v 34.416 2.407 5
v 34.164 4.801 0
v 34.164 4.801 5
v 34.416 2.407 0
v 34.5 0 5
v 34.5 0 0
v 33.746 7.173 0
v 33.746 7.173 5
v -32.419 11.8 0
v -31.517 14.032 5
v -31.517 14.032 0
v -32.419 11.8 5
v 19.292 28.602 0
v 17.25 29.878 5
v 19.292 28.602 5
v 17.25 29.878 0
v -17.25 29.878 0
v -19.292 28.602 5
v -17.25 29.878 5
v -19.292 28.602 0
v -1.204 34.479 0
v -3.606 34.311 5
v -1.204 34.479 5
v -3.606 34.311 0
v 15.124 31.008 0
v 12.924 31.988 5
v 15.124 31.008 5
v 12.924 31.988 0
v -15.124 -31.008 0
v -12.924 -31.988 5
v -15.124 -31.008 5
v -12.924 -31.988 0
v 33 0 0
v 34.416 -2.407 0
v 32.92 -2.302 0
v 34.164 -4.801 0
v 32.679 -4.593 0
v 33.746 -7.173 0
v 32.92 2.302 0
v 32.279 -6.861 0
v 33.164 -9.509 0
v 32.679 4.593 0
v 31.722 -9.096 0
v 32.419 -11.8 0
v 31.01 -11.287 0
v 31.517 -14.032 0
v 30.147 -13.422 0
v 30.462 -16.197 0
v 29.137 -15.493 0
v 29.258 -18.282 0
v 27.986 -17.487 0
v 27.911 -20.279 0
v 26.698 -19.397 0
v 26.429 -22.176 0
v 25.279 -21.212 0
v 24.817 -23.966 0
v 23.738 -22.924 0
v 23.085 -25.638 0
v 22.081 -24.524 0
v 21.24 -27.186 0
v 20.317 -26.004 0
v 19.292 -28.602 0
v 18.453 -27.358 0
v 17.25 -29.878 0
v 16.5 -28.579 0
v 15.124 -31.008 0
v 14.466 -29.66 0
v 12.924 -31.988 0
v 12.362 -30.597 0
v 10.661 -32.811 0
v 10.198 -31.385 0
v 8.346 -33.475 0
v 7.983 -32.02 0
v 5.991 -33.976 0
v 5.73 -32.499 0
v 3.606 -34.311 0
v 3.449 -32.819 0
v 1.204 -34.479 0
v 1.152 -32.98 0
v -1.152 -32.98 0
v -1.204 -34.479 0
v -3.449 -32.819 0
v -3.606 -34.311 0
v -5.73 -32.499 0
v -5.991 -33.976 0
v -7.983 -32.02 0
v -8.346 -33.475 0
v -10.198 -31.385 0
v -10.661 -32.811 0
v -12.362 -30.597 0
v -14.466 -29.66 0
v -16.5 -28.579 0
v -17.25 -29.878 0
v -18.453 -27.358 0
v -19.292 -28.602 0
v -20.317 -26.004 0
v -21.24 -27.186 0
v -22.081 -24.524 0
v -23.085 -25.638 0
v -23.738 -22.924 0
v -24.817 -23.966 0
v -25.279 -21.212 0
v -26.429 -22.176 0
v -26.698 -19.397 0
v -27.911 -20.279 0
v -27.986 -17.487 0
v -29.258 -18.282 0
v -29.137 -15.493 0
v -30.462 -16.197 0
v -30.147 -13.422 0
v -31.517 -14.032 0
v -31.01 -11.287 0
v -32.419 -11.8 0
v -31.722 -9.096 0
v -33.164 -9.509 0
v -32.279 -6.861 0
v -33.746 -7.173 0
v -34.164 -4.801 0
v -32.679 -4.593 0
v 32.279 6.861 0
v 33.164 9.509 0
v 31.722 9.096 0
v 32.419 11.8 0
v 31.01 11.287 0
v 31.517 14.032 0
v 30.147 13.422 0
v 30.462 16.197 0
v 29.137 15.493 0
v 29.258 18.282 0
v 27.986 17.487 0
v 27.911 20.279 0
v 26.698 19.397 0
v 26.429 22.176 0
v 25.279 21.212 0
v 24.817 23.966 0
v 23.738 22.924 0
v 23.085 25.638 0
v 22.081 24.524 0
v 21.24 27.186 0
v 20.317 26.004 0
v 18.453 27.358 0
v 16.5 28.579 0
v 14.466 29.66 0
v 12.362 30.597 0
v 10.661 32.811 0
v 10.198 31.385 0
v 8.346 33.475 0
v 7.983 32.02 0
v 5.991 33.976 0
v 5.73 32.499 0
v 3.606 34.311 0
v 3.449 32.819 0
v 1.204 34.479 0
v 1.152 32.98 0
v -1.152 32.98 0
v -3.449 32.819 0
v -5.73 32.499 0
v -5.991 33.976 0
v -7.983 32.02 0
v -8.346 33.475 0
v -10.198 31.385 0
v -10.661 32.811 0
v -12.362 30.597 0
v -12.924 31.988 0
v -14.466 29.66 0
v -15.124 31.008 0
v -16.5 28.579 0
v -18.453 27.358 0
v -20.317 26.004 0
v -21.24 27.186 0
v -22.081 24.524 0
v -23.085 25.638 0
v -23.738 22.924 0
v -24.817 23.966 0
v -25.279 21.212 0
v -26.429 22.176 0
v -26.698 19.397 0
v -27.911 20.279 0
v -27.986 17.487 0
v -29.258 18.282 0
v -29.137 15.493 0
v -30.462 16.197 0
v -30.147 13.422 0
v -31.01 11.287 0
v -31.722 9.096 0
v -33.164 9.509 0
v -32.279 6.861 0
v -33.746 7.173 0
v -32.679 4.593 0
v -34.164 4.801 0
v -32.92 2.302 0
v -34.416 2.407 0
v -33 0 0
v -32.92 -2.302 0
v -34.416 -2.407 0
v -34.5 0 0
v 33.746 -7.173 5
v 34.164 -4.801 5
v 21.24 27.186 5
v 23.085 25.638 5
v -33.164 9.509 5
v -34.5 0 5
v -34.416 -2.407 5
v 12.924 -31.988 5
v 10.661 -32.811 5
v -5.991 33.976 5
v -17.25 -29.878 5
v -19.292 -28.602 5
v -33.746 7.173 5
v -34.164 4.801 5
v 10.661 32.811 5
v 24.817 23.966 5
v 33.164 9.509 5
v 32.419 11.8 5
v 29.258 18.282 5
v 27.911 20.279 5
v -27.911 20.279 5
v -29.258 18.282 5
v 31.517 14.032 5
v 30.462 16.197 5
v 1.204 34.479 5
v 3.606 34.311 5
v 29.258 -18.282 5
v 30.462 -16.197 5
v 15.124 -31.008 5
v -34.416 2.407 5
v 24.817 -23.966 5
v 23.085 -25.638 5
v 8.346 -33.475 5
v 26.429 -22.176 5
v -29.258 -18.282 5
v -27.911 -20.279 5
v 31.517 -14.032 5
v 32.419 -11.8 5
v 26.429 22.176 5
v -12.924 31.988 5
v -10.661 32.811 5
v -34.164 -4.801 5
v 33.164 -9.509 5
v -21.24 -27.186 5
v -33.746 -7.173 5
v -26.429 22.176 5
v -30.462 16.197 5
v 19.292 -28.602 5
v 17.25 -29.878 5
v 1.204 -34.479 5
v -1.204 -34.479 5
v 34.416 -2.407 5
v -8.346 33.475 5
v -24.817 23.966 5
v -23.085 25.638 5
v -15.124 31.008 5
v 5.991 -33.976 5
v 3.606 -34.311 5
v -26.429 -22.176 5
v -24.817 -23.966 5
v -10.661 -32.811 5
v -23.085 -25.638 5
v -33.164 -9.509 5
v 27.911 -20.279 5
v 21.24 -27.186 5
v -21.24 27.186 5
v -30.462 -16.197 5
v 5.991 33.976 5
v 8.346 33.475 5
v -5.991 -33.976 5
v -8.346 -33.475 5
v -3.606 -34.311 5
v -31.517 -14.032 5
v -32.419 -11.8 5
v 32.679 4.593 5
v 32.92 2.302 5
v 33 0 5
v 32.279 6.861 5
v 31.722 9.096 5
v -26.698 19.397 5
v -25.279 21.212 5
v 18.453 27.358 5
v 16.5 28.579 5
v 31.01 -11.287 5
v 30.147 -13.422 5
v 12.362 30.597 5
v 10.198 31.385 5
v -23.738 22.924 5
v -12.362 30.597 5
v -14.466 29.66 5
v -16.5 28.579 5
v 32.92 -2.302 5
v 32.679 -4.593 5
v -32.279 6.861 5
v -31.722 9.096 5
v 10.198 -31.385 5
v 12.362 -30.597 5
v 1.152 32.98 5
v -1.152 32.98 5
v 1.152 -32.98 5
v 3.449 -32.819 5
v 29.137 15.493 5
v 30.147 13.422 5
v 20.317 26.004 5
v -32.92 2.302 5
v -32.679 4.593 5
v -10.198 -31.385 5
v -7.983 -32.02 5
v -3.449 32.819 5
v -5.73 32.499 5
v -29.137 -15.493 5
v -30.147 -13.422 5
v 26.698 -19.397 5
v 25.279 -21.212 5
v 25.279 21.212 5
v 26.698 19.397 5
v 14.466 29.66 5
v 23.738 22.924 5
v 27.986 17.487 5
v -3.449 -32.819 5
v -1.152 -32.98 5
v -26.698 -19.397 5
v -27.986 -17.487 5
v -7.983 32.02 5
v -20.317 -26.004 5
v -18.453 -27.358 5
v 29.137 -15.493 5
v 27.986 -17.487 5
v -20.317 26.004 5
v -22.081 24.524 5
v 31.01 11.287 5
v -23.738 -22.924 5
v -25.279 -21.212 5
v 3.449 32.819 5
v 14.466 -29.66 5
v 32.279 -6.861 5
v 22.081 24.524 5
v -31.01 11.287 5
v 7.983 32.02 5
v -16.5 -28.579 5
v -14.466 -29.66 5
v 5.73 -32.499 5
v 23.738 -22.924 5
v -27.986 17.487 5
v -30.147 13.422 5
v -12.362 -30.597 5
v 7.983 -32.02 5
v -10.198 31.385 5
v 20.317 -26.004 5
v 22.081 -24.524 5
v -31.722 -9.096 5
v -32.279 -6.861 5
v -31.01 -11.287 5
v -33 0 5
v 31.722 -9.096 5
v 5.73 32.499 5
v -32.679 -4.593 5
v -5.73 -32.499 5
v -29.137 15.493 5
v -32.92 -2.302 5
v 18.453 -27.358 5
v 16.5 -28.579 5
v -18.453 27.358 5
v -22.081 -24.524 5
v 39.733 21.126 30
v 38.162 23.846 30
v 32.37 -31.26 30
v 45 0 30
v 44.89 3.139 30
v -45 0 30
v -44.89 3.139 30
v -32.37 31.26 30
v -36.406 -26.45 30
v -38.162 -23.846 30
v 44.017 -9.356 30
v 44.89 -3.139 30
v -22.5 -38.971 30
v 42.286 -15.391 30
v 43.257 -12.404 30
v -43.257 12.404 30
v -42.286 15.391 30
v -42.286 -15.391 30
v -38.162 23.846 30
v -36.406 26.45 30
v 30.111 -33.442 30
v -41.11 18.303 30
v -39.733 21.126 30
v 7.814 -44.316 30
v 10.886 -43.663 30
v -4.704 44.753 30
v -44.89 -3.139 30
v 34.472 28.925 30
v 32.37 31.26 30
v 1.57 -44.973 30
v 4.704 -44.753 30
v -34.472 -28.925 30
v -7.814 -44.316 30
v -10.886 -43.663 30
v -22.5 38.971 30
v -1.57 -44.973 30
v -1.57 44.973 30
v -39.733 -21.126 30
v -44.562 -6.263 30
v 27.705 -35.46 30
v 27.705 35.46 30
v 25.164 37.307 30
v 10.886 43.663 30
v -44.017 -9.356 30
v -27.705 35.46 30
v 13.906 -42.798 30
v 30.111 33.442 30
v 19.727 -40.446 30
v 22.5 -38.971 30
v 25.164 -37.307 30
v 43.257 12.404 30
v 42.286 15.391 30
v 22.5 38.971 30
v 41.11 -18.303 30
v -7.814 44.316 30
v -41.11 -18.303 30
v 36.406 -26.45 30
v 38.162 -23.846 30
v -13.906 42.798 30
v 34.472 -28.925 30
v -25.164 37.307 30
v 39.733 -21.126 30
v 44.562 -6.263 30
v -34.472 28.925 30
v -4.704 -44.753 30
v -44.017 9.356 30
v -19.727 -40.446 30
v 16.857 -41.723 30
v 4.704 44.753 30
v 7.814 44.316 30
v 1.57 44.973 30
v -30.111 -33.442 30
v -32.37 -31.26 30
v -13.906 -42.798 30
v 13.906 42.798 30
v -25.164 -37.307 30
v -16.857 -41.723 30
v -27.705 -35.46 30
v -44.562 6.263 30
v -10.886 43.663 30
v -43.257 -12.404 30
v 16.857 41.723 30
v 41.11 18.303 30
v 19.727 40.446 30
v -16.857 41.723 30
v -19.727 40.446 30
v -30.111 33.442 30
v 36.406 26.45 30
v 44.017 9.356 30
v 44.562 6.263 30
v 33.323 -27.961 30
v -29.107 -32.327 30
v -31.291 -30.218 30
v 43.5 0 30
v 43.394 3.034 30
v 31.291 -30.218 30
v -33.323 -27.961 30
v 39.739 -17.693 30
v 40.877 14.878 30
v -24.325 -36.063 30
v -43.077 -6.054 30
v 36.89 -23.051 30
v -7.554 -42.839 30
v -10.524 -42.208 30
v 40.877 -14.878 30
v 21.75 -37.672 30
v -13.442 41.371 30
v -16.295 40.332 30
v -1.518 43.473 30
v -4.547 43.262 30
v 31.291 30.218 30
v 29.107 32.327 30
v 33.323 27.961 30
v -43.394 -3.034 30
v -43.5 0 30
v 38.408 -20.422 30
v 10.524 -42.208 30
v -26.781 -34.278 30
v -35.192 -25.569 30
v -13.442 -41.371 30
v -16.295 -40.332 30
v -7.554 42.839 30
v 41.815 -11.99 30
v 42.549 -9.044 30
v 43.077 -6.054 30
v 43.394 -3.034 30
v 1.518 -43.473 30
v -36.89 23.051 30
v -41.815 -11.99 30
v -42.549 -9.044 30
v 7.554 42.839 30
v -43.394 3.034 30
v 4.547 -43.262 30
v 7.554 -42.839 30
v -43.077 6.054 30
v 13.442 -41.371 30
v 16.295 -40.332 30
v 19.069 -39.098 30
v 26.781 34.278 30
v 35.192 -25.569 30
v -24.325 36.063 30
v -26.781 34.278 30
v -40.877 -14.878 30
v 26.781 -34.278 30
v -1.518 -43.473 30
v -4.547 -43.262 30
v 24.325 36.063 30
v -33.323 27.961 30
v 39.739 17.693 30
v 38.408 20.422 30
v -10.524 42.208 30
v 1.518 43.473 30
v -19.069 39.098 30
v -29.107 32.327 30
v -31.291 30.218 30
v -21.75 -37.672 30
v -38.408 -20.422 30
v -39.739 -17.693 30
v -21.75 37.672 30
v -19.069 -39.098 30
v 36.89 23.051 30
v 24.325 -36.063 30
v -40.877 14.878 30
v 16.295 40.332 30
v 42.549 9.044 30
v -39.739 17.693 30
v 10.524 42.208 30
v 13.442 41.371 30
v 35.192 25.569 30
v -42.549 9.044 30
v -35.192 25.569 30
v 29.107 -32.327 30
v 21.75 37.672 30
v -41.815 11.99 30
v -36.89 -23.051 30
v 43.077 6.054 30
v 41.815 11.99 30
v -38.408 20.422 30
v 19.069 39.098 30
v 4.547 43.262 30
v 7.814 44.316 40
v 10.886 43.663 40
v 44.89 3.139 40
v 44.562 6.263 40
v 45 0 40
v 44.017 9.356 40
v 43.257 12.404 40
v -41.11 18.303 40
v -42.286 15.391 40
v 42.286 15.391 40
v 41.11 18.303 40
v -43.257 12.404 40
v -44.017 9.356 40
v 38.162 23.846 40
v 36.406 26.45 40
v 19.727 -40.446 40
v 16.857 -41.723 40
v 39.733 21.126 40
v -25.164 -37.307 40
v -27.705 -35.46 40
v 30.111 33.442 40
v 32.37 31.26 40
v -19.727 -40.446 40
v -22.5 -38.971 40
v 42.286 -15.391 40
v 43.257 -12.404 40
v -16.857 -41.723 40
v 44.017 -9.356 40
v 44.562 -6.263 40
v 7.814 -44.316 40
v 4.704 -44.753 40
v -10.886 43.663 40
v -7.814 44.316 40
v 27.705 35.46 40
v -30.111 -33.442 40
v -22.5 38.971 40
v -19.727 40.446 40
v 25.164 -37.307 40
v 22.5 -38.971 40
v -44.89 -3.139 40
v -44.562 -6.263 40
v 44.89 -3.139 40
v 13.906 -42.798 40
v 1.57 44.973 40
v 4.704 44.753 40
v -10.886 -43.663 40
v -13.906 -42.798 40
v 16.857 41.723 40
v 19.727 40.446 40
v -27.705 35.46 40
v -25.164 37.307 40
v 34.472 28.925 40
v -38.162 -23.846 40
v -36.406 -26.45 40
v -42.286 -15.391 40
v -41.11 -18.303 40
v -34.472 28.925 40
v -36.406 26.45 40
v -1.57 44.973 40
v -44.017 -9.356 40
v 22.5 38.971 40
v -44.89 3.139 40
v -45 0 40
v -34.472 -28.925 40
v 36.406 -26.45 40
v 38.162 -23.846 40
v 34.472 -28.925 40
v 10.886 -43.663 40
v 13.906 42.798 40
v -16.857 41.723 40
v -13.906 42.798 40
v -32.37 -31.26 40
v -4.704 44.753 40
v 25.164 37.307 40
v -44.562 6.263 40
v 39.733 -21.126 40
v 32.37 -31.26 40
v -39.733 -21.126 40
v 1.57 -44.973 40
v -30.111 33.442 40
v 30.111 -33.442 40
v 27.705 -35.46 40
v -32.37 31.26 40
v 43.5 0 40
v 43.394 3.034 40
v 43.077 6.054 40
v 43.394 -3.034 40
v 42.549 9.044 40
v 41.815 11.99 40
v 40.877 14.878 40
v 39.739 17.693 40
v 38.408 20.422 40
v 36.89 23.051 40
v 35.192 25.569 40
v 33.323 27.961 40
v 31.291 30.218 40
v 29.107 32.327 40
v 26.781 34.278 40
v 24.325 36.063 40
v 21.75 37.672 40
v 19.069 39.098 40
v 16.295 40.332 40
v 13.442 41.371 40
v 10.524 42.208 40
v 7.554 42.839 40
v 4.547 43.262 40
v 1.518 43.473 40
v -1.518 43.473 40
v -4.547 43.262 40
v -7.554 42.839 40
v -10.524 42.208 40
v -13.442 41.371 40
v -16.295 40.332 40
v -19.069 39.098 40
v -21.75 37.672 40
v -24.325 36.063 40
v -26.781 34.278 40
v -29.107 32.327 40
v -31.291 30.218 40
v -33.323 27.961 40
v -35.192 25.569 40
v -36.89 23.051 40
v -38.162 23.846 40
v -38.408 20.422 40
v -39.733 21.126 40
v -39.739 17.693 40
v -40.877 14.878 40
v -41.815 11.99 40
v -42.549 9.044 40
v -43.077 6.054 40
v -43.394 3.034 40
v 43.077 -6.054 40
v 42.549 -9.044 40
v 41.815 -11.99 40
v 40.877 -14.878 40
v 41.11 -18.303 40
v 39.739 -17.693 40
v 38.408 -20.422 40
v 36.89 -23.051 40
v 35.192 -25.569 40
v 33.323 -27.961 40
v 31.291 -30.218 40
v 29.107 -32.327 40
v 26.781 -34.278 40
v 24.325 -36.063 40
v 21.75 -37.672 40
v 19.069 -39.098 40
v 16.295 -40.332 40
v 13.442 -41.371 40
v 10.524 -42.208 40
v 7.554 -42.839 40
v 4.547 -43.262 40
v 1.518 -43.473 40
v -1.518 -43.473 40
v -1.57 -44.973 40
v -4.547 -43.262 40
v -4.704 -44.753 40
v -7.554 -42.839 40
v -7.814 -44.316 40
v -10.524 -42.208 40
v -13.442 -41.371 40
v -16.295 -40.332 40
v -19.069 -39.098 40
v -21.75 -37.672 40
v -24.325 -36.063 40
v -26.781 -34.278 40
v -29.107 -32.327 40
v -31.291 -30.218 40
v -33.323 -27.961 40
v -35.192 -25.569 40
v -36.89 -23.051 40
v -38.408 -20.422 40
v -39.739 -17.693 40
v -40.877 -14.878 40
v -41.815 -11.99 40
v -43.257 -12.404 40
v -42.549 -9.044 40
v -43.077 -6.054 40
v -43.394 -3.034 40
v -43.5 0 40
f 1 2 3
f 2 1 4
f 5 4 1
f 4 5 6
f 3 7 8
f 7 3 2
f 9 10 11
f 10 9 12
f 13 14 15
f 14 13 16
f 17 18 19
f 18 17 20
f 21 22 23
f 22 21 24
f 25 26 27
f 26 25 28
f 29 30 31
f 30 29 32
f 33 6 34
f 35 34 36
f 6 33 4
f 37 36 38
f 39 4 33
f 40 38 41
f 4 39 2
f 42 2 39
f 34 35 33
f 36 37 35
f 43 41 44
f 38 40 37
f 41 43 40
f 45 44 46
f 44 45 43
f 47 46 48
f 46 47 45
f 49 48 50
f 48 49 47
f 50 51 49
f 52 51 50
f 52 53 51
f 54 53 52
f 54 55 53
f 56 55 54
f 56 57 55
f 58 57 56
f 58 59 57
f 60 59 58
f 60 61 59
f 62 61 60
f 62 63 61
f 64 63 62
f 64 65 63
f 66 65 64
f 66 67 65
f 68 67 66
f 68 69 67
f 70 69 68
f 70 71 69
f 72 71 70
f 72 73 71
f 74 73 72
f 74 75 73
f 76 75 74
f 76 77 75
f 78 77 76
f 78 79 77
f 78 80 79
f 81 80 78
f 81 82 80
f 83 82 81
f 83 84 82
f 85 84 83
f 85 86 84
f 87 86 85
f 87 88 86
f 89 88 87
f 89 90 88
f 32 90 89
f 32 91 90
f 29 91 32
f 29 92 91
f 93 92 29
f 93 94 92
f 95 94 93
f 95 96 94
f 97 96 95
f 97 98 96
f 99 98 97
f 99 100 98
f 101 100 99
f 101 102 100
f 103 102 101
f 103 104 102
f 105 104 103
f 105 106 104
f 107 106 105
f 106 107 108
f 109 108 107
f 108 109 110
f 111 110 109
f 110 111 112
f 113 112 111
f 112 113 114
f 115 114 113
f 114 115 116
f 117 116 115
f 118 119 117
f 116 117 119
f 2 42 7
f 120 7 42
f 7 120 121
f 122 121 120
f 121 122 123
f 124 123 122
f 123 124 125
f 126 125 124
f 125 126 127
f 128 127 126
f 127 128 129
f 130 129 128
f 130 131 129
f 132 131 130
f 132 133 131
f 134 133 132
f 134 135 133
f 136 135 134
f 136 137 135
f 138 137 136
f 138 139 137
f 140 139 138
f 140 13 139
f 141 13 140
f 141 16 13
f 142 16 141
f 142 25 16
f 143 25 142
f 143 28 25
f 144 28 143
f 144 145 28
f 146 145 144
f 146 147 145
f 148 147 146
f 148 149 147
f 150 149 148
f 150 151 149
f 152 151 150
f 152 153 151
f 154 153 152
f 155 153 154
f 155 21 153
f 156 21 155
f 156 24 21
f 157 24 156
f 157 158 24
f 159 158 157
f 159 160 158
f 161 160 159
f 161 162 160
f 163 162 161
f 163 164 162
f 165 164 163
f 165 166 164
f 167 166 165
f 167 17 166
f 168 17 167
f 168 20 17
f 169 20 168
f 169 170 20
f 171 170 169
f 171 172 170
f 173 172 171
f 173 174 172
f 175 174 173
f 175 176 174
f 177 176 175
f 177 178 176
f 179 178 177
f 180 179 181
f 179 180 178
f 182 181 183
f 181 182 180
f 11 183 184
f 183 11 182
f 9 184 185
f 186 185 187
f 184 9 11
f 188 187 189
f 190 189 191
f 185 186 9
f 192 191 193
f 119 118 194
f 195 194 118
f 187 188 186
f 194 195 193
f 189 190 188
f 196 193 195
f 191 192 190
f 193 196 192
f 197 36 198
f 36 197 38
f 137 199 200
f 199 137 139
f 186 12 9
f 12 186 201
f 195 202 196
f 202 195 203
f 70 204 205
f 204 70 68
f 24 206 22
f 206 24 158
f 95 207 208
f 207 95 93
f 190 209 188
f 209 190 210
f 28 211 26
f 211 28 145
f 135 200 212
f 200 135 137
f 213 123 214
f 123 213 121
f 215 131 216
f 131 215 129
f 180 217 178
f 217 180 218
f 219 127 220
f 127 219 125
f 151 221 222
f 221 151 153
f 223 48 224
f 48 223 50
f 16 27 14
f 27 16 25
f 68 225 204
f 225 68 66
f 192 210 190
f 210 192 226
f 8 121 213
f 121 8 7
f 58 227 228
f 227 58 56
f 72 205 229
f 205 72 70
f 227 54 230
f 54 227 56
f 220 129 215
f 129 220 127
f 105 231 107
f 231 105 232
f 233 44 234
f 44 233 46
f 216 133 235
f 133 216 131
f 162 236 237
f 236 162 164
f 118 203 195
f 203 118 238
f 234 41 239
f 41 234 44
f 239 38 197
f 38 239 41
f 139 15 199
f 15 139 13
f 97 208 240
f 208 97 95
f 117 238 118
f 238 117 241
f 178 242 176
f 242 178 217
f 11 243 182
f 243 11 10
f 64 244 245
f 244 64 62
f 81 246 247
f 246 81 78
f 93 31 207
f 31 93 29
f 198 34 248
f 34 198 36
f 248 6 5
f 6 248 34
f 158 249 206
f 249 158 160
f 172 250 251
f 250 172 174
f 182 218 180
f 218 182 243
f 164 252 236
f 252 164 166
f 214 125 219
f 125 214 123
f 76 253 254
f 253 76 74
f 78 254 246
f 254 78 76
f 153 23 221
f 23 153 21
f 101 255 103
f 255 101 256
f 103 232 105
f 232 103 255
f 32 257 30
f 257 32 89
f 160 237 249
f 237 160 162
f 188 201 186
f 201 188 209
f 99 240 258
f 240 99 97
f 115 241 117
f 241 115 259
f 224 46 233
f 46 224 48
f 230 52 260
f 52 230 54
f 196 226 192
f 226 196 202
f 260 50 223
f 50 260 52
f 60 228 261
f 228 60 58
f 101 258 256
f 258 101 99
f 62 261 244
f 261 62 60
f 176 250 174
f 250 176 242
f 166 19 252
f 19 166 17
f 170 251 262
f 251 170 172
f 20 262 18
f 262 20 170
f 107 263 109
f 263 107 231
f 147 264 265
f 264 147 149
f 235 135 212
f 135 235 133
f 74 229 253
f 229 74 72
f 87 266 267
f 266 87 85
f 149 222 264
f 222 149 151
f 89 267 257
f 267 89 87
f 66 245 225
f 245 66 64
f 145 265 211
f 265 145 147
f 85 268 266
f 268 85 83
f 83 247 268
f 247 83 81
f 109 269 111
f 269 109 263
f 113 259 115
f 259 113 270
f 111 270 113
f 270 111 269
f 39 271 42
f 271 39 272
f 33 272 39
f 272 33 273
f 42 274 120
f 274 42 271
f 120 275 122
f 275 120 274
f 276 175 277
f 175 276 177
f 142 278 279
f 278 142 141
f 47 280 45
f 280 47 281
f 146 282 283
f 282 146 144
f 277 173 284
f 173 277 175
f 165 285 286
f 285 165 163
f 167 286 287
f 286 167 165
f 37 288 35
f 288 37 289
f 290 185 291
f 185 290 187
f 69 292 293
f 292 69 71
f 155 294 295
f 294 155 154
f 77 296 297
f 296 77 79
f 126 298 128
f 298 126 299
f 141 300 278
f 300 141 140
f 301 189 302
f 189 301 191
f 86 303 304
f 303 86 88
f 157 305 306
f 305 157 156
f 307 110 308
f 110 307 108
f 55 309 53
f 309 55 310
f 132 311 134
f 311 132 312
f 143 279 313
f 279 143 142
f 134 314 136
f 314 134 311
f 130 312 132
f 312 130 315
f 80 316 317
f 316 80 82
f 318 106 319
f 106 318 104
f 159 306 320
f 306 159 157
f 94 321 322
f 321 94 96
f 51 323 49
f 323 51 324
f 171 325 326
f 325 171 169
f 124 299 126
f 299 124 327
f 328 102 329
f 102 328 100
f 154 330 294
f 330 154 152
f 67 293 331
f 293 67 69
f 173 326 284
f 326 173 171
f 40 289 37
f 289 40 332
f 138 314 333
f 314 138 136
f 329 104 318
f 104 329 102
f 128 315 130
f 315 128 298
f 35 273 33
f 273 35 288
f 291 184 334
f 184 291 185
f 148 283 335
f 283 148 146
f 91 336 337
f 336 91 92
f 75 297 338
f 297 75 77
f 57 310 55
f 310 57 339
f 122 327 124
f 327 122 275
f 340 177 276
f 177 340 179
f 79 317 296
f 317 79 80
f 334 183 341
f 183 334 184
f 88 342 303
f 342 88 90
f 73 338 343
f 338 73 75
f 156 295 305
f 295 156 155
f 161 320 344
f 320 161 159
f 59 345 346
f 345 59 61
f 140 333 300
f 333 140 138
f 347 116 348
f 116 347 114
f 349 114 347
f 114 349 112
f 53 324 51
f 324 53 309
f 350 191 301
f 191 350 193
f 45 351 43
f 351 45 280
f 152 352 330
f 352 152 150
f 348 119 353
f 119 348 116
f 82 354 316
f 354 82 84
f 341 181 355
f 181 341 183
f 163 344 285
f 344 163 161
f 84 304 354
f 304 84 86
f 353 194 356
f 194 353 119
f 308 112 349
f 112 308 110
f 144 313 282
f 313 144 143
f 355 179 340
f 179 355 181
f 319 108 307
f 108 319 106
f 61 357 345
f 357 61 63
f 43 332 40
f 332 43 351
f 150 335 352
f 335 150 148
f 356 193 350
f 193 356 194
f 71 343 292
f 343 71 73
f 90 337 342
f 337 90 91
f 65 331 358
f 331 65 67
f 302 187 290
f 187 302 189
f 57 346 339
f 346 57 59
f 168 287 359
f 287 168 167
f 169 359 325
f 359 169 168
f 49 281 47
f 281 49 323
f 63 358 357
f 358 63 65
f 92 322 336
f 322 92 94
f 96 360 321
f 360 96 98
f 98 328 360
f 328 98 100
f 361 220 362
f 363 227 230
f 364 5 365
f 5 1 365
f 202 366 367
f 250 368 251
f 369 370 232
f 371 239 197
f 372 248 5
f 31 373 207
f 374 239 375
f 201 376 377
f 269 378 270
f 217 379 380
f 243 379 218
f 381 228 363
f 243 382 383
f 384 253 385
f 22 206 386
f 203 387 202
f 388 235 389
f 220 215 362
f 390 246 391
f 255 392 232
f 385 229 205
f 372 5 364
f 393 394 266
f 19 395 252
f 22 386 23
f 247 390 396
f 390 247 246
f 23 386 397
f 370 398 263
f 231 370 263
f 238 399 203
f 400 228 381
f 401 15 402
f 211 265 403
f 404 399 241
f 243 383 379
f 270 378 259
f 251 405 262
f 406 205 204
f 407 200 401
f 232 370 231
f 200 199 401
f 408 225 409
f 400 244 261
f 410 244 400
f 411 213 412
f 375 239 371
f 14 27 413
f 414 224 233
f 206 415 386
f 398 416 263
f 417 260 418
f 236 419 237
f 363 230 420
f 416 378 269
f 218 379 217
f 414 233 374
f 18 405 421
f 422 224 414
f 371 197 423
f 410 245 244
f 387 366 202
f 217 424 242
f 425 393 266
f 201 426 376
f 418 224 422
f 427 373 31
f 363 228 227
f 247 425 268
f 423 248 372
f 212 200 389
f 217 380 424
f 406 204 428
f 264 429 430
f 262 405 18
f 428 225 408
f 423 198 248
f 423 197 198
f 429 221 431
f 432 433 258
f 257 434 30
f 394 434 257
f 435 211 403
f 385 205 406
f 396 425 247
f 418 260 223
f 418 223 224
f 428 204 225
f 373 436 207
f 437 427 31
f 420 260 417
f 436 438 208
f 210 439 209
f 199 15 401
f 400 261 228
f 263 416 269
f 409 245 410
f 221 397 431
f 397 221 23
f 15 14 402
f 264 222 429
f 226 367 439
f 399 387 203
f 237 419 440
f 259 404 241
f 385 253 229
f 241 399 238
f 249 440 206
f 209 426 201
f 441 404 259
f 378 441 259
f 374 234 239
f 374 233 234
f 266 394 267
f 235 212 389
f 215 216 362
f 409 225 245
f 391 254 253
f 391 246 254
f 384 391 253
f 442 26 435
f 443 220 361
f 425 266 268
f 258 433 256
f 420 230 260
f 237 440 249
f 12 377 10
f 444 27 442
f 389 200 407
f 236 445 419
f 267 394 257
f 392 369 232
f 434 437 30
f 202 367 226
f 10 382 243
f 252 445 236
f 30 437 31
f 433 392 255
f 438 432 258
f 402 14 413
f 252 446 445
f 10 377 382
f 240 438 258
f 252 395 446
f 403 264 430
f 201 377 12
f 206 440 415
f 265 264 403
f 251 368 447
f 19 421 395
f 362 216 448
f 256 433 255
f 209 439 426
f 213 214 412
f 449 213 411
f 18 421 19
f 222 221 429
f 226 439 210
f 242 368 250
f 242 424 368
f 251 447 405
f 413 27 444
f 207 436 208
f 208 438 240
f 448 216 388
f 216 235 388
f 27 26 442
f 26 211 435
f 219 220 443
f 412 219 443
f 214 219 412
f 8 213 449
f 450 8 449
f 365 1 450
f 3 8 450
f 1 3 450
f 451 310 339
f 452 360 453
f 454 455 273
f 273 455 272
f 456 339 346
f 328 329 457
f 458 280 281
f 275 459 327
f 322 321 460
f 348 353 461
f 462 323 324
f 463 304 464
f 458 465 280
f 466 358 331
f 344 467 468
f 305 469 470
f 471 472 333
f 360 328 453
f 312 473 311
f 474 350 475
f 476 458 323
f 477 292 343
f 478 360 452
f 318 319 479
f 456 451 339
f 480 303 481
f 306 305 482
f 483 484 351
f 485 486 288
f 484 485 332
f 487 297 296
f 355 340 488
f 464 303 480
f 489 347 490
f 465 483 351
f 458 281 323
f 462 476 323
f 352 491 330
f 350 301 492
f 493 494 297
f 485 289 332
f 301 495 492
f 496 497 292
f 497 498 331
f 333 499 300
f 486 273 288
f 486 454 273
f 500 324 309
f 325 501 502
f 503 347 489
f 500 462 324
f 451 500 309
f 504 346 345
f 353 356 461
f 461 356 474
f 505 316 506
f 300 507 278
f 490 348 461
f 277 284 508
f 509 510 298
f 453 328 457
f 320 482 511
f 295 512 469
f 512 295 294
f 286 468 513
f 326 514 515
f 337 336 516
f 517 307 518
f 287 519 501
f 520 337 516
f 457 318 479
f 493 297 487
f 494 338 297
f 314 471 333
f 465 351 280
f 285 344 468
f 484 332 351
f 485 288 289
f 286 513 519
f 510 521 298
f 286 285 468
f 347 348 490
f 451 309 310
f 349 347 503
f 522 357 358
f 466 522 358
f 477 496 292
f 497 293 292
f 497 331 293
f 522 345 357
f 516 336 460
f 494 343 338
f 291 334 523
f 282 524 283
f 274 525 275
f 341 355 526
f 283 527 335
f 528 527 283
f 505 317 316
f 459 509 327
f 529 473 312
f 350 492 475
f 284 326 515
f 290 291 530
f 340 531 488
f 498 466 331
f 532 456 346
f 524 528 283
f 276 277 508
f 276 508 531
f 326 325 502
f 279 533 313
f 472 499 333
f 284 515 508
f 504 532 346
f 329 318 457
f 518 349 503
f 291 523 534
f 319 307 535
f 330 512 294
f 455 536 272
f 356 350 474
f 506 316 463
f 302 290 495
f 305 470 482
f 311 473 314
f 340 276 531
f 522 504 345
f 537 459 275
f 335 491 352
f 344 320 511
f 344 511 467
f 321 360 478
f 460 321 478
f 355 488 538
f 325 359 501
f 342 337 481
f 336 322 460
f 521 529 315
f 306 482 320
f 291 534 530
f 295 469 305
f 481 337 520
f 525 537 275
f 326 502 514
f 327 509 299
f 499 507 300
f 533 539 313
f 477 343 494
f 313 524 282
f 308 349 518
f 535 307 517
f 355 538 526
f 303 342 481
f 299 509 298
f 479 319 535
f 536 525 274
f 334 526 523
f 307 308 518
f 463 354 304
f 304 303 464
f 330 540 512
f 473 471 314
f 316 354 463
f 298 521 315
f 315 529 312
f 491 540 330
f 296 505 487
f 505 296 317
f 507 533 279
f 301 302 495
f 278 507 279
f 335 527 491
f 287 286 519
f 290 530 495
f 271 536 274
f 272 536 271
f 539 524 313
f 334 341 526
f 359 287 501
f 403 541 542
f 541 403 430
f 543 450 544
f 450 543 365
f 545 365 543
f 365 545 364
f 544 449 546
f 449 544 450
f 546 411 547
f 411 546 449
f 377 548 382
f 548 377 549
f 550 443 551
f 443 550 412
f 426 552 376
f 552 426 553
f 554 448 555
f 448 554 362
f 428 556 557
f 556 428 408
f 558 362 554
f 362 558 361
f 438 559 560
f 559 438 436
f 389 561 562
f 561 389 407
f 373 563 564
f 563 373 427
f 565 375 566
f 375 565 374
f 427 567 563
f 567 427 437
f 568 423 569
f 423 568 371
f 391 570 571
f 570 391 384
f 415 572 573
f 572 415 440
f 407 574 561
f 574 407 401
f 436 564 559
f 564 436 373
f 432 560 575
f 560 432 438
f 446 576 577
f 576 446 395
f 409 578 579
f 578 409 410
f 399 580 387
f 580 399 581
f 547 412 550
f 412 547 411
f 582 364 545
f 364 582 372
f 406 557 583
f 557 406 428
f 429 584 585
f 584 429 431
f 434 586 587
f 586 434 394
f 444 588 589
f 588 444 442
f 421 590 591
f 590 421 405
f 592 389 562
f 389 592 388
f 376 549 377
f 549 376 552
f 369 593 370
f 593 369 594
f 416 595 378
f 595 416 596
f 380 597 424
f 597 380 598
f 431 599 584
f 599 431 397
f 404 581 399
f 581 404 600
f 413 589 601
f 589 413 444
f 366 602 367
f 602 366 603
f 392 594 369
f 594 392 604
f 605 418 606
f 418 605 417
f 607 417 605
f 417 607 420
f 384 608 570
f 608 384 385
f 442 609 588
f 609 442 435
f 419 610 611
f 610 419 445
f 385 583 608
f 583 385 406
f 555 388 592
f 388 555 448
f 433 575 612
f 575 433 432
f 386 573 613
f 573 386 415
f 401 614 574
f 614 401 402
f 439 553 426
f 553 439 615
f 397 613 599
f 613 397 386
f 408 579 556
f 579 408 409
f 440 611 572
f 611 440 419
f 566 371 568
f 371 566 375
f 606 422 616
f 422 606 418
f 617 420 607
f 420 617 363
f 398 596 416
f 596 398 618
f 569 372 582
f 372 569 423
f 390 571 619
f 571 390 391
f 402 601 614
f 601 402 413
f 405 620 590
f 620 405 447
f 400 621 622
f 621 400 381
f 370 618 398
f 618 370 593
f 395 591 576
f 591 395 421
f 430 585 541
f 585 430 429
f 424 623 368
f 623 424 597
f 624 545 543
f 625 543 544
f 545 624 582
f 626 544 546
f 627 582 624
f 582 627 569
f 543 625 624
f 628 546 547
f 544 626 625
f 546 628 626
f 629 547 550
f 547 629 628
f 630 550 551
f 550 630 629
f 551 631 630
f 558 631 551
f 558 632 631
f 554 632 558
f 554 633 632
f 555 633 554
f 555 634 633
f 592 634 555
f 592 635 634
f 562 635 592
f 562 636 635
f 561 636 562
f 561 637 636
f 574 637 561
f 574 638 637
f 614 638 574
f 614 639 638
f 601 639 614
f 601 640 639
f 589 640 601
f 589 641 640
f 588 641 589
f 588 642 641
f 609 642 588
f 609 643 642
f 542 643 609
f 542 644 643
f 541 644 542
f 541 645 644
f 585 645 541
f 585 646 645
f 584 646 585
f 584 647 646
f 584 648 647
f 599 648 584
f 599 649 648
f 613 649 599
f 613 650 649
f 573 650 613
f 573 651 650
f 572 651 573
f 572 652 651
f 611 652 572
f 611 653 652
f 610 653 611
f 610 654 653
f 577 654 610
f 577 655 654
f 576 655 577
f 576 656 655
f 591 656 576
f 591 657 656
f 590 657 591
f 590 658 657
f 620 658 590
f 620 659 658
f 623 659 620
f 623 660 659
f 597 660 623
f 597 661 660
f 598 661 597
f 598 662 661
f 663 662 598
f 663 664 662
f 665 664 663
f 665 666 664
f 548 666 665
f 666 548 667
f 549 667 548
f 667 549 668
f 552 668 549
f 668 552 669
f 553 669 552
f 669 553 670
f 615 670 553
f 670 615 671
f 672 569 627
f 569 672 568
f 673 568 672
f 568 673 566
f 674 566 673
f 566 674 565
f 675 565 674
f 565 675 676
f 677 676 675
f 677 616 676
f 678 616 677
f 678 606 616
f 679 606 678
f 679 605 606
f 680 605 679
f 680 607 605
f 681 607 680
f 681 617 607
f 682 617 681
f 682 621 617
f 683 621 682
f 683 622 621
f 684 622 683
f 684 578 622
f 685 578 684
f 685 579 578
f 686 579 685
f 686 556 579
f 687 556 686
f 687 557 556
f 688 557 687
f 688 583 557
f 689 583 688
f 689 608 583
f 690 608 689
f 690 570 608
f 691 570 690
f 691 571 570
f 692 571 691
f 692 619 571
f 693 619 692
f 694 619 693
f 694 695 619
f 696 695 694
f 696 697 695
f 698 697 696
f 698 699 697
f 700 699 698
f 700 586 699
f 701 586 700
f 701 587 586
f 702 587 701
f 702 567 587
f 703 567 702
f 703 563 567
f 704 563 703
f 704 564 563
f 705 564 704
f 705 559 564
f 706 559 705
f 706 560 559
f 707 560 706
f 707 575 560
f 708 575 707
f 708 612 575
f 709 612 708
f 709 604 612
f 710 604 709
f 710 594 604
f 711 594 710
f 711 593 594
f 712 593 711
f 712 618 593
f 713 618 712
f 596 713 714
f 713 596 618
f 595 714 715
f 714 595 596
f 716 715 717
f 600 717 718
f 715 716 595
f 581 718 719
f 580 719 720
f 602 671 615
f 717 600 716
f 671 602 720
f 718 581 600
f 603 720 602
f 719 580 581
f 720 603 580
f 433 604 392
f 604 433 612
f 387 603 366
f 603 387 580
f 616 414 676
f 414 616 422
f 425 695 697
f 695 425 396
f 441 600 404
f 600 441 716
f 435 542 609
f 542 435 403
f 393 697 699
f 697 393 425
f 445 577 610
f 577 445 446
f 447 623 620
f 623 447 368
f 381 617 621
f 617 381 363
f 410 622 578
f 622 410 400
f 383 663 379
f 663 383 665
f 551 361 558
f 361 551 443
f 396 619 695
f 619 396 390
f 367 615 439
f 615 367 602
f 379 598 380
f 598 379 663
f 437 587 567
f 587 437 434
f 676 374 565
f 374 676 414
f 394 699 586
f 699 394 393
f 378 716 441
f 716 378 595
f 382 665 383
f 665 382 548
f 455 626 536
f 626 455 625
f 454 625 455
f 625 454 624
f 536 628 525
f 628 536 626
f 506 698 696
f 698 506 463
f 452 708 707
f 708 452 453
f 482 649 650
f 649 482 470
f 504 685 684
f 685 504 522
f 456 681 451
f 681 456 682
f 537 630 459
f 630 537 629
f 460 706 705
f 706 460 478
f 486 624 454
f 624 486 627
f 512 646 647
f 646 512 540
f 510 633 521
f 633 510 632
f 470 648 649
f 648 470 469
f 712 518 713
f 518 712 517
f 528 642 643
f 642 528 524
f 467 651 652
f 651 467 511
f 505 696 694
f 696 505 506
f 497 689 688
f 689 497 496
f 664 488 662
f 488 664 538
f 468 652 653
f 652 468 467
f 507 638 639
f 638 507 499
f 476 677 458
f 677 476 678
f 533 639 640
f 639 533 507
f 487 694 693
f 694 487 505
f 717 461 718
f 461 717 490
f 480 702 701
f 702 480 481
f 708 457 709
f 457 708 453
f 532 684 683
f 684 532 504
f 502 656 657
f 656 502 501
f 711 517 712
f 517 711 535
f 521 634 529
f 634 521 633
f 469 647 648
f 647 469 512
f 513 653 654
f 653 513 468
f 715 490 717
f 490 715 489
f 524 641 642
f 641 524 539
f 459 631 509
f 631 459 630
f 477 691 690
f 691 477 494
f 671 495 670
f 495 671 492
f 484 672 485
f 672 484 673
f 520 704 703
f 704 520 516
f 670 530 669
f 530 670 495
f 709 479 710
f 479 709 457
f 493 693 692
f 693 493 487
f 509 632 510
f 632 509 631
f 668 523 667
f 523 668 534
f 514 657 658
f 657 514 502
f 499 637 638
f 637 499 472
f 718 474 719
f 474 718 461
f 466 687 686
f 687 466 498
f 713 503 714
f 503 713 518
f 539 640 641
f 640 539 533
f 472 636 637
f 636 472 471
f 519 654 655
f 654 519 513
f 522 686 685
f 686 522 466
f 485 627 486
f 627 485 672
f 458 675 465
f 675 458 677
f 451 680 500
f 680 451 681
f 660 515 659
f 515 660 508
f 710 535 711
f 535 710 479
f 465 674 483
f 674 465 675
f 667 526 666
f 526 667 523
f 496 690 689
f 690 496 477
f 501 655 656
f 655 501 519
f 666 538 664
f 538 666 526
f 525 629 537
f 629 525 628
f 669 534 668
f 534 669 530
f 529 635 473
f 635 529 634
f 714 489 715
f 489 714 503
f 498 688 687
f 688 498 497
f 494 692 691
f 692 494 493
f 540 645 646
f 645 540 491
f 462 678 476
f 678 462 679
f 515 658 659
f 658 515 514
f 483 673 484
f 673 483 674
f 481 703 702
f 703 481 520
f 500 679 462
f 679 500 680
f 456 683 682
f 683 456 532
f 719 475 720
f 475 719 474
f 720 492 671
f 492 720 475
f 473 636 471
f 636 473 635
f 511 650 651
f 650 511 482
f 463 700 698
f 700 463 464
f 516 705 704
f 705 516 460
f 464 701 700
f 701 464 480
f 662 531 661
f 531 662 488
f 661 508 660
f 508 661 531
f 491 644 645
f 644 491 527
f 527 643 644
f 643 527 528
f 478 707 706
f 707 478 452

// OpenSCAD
//Parameterised coupling generator
// Glyn Cowles Mar/Apr 2013


//Thickness of tube walls 
thickness=1.5; 
//Outside diameter of bottom tube 
d1=69;   
//Height of bottom tube 
h1=5;   
//Outside diameter of top tube
d2=90;   
//Height of top tube
h2=10;   
//Height of connector section
c_ht=25; 
// resolution
$fn=90;
assemble(); 
//-----------------------------------------------------------------------
module tube(d,h) {
rad=d/2;
difference() {
cylinder(h=h,r=rad);
cylinder(h=h,r=rad-thickness);
}
}
//-----------------------------------------------------------------------

module connector(){
difference() {
 cylinder (h=c_ht,r1=d1/2,r2=d2/2);
 cylinder (h=c_ht,r1=d1/2-thickness,r2=d2/2-thickness);
}
}

module assemble() {
union() {
	tube(d1,h1);
	translate([0,0,h1]) connector(); 
	translate([0,0,h1+c_ht])  tube(d2,h2);
	}
};



